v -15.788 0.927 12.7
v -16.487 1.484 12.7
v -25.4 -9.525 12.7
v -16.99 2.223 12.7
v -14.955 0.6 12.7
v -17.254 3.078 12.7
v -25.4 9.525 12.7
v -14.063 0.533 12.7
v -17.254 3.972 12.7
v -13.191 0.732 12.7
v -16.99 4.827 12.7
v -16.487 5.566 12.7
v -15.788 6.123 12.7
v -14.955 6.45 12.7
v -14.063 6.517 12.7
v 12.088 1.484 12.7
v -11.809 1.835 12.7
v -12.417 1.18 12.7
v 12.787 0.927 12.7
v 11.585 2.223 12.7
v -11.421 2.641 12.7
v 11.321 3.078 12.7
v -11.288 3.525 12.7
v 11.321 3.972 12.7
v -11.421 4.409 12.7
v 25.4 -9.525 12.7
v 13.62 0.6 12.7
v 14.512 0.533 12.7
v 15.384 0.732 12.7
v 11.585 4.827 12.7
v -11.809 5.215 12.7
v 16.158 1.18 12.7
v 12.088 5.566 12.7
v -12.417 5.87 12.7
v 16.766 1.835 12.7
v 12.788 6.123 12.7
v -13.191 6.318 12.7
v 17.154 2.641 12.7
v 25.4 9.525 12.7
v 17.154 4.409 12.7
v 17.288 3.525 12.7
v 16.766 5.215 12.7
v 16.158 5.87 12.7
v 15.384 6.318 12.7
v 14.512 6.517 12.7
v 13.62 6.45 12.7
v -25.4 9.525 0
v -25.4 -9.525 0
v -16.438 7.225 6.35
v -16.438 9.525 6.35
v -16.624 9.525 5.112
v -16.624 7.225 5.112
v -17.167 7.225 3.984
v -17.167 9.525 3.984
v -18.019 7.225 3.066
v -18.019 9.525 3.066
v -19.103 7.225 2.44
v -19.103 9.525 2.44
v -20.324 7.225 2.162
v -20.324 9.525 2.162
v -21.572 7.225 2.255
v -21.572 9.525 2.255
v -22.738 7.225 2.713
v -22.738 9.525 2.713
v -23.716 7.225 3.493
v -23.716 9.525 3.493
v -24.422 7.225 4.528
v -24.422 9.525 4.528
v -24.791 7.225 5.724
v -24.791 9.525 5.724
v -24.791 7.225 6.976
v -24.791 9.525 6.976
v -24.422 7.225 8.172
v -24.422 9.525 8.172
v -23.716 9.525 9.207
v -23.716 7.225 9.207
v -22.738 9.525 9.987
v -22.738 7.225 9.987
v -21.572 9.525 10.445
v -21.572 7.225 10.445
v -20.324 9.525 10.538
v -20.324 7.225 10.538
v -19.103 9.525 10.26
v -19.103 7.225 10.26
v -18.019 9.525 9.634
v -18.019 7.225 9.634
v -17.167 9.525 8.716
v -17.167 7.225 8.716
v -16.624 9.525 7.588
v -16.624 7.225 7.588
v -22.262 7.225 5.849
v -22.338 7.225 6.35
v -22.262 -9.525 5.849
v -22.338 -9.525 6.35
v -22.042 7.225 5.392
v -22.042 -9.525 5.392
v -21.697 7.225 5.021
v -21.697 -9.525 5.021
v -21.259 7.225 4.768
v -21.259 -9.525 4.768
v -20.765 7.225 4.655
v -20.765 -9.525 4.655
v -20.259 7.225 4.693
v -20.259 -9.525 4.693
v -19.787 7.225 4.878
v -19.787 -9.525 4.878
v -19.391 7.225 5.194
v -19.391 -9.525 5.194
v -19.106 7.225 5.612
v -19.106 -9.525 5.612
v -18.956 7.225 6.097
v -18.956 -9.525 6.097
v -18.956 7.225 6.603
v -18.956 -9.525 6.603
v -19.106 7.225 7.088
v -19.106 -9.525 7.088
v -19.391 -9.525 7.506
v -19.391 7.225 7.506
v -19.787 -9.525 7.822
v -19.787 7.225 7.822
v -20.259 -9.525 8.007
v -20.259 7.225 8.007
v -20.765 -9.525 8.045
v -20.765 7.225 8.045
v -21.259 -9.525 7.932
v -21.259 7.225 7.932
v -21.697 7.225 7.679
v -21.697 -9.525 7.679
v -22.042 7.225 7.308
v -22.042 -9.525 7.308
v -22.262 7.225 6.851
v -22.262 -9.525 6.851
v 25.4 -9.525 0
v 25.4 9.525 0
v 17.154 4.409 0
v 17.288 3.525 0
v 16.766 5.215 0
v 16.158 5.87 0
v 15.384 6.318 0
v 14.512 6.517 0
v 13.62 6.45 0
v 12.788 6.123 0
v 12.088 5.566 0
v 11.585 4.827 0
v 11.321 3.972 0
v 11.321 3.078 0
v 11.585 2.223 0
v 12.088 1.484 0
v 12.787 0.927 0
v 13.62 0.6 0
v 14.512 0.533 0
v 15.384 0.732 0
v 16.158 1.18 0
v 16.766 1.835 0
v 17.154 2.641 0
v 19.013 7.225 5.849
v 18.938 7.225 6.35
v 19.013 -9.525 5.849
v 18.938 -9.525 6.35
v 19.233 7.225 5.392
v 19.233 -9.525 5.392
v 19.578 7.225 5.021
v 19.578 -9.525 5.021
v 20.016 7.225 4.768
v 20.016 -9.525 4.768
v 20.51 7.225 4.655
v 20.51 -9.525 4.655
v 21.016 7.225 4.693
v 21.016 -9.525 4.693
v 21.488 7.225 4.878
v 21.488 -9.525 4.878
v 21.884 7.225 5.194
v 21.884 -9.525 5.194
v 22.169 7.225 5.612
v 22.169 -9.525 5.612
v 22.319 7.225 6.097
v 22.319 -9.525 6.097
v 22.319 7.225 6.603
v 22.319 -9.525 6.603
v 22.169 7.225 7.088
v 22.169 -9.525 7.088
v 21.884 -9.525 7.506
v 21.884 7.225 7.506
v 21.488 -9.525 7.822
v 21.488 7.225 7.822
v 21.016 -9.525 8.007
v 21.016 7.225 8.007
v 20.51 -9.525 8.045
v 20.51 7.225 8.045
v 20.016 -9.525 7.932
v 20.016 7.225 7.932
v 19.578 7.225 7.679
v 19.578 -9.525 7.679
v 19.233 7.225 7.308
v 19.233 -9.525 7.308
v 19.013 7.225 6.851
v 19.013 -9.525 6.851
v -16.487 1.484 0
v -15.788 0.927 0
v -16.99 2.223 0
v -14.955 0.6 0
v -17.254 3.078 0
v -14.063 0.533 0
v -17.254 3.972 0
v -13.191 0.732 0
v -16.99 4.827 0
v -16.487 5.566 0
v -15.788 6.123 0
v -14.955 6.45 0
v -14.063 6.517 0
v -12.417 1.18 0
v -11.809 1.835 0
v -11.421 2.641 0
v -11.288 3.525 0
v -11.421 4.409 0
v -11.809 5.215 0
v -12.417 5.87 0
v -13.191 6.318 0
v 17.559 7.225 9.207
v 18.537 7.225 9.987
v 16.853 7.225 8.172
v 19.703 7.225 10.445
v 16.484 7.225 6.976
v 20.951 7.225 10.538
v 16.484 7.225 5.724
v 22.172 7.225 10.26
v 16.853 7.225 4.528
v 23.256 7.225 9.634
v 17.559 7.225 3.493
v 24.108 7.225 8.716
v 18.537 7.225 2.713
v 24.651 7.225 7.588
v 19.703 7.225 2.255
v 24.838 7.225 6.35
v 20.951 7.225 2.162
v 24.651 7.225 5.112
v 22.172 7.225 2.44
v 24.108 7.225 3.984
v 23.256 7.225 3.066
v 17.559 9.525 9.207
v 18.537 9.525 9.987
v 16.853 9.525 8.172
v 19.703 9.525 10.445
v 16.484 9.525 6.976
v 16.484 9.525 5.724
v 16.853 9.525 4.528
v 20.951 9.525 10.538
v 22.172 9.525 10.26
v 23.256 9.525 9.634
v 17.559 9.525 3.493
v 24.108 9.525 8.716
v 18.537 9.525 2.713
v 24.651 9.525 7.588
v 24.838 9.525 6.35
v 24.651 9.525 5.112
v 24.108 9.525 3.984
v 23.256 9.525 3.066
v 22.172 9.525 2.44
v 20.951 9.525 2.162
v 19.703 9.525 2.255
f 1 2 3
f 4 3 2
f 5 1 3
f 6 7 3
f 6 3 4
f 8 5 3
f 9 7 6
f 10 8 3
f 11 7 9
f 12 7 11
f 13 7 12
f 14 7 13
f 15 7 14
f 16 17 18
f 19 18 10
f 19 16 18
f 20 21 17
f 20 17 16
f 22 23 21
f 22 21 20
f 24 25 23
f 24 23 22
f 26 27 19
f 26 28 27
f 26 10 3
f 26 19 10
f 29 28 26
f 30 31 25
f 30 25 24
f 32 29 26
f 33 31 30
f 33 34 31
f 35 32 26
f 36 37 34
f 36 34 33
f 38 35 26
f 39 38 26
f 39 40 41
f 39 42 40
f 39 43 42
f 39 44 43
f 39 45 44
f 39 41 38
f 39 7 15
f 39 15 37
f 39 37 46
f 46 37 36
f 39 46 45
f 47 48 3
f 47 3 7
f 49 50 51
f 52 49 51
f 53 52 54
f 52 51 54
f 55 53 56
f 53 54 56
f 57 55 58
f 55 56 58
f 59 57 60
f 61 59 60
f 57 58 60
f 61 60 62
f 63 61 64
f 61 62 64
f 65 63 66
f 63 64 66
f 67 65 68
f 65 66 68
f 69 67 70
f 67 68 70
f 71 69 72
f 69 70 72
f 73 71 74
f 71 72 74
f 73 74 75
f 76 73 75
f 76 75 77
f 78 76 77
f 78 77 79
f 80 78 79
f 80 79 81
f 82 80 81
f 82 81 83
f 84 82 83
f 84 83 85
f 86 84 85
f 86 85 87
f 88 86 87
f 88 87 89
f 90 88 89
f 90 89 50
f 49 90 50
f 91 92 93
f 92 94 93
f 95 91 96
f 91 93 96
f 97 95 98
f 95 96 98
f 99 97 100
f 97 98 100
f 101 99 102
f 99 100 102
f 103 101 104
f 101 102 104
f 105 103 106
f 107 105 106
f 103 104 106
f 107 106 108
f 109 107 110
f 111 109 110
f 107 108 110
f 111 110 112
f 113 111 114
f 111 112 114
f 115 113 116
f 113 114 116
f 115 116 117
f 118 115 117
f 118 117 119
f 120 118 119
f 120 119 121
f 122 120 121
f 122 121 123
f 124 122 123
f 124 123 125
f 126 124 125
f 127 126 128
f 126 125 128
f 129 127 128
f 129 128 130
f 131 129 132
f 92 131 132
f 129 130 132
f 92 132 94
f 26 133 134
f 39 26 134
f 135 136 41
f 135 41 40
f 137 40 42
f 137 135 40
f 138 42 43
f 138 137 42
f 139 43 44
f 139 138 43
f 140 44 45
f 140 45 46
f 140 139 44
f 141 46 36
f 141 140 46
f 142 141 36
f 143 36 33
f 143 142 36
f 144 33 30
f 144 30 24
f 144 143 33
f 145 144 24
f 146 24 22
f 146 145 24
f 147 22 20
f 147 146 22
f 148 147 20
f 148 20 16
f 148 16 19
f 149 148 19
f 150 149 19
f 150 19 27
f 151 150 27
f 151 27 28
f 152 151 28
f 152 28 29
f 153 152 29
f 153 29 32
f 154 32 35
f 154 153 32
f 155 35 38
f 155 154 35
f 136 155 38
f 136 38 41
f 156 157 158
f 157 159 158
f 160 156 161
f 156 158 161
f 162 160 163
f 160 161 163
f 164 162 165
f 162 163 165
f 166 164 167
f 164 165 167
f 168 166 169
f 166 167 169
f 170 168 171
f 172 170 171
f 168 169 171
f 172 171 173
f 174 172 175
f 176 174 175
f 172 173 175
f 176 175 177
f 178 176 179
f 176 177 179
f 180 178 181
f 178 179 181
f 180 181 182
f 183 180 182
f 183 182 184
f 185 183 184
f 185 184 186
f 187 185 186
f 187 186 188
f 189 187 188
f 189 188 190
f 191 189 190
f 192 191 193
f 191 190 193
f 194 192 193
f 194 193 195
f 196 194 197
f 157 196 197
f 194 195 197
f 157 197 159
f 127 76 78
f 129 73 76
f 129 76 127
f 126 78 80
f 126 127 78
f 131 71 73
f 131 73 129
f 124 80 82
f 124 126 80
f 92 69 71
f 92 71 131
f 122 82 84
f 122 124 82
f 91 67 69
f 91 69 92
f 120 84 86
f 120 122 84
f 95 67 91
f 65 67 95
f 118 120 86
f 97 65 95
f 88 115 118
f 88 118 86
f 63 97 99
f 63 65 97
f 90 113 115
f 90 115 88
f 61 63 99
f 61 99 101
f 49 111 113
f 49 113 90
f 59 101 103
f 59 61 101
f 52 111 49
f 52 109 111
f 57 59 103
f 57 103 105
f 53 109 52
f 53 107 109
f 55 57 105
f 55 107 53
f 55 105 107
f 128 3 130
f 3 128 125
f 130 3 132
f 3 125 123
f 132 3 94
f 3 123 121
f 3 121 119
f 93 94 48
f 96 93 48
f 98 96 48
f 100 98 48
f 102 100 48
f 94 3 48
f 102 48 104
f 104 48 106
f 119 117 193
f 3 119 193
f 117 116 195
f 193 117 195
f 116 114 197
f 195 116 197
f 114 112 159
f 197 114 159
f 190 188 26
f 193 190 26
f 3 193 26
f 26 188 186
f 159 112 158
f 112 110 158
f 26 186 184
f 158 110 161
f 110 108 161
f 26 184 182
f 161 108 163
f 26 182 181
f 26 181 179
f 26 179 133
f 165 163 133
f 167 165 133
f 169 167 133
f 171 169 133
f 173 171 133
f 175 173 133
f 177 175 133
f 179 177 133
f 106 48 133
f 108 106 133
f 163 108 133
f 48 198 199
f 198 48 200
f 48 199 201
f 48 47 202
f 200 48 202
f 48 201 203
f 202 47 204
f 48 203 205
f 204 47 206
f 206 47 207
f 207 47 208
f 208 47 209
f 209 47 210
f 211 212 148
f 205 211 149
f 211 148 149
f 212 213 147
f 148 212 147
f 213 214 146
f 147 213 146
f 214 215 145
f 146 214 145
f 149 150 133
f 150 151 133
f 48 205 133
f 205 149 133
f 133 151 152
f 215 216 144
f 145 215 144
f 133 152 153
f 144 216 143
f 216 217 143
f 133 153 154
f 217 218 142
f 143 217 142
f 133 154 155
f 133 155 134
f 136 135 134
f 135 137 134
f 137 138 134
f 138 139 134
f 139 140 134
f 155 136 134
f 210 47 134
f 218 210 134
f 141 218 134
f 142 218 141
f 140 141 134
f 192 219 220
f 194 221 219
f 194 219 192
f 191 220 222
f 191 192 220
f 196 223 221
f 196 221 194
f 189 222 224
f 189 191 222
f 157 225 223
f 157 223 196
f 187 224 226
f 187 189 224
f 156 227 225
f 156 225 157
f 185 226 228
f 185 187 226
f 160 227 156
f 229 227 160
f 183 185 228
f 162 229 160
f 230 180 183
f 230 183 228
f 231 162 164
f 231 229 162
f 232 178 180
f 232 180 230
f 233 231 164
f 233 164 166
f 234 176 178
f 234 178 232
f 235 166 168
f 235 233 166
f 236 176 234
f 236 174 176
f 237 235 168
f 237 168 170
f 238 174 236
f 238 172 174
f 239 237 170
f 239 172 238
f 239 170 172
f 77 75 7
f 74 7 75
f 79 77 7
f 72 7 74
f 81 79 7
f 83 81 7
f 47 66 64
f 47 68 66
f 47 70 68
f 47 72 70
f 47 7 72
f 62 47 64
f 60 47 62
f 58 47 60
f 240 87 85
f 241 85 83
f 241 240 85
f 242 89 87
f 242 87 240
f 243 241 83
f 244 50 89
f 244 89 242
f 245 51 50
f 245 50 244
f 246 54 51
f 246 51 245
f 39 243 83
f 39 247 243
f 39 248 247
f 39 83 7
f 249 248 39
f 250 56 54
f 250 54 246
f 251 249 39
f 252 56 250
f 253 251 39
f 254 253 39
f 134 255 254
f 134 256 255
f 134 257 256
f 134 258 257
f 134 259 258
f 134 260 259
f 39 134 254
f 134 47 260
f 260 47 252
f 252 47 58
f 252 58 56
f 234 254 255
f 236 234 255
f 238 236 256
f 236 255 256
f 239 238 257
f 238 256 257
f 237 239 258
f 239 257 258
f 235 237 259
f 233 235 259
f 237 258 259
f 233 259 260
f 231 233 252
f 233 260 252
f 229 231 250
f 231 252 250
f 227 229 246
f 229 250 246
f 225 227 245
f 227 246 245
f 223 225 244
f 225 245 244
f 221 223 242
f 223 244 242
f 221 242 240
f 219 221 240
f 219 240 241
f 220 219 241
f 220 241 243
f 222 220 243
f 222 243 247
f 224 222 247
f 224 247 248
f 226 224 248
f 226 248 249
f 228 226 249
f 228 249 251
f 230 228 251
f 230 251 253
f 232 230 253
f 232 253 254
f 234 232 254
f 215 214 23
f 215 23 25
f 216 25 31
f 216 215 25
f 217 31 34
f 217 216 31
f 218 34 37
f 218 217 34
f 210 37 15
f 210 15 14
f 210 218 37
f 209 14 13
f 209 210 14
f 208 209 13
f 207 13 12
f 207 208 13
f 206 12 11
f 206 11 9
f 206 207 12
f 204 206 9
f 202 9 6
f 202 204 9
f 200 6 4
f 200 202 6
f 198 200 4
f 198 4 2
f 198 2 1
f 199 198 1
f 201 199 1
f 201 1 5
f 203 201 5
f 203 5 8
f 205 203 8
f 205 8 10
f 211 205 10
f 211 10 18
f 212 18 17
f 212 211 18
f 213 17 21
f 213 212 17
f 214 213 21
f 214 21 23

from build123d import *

# Parameters (mm, degrees)
SKETCH1_W                                        = 50.8
SKETCH1_H                                        = 19.05
SKETCH1_R                                        = 3
BOSS_EXTRUDE1_DEPTH                              = 12.7
CBORE_FOR_M3_HEX_HEAD_MACHINE_SCREW1_D           = 3.4
CBORE_FOR_M3_HEX_HEAD_MACHINE_SCREW1_CBORE_D     = 8.4
CBORE_FOR_M3_HEX_HEAD_MACHINE_SCREW1_CBORE_DEPTH = 2.3


with BuildPart() as part:
    # Sketch1 → Boss-Extrude1 (new body)
    with BuildSketch(Plane.XY):
        Rectangle(SKETCH1_W, SKETCH1_H)
        with Locations((-14.2875, 3.525)):
            Circle(SKETCH1_R, mode=Mode.SUBTRACT)
        with Locations((14.2875, 3.525)):
            Circle(SKETCH1_R, mode=Mode.SUBTRACT)
    extrude(amount=BOSS_EXTRUDE1_DEPTH)

    # CBORE for M3 Hex Head Machine Screw1 (through all)
    with Locations(Plane(origin=(0, 9.525, 0), x_dir=(1, 0, 0), z_dir=(0, 1, 0))):
        with Locations((-20.6375, -6.35), (20.6375, -6.35)):
            CounterBoreHole(CBORE_FOR_M3_HEX_HEAD_MACHINE_SCREW1_D / 2, CBORE_FOR_M3_HEX_HEAD_MACHINE_SCREW1_CBORE_D / 2, CBORE_FOR_M3_HEX_HEAD_MACHINE_SCREW1_CBORE_DEPTH)


solid = part.part
